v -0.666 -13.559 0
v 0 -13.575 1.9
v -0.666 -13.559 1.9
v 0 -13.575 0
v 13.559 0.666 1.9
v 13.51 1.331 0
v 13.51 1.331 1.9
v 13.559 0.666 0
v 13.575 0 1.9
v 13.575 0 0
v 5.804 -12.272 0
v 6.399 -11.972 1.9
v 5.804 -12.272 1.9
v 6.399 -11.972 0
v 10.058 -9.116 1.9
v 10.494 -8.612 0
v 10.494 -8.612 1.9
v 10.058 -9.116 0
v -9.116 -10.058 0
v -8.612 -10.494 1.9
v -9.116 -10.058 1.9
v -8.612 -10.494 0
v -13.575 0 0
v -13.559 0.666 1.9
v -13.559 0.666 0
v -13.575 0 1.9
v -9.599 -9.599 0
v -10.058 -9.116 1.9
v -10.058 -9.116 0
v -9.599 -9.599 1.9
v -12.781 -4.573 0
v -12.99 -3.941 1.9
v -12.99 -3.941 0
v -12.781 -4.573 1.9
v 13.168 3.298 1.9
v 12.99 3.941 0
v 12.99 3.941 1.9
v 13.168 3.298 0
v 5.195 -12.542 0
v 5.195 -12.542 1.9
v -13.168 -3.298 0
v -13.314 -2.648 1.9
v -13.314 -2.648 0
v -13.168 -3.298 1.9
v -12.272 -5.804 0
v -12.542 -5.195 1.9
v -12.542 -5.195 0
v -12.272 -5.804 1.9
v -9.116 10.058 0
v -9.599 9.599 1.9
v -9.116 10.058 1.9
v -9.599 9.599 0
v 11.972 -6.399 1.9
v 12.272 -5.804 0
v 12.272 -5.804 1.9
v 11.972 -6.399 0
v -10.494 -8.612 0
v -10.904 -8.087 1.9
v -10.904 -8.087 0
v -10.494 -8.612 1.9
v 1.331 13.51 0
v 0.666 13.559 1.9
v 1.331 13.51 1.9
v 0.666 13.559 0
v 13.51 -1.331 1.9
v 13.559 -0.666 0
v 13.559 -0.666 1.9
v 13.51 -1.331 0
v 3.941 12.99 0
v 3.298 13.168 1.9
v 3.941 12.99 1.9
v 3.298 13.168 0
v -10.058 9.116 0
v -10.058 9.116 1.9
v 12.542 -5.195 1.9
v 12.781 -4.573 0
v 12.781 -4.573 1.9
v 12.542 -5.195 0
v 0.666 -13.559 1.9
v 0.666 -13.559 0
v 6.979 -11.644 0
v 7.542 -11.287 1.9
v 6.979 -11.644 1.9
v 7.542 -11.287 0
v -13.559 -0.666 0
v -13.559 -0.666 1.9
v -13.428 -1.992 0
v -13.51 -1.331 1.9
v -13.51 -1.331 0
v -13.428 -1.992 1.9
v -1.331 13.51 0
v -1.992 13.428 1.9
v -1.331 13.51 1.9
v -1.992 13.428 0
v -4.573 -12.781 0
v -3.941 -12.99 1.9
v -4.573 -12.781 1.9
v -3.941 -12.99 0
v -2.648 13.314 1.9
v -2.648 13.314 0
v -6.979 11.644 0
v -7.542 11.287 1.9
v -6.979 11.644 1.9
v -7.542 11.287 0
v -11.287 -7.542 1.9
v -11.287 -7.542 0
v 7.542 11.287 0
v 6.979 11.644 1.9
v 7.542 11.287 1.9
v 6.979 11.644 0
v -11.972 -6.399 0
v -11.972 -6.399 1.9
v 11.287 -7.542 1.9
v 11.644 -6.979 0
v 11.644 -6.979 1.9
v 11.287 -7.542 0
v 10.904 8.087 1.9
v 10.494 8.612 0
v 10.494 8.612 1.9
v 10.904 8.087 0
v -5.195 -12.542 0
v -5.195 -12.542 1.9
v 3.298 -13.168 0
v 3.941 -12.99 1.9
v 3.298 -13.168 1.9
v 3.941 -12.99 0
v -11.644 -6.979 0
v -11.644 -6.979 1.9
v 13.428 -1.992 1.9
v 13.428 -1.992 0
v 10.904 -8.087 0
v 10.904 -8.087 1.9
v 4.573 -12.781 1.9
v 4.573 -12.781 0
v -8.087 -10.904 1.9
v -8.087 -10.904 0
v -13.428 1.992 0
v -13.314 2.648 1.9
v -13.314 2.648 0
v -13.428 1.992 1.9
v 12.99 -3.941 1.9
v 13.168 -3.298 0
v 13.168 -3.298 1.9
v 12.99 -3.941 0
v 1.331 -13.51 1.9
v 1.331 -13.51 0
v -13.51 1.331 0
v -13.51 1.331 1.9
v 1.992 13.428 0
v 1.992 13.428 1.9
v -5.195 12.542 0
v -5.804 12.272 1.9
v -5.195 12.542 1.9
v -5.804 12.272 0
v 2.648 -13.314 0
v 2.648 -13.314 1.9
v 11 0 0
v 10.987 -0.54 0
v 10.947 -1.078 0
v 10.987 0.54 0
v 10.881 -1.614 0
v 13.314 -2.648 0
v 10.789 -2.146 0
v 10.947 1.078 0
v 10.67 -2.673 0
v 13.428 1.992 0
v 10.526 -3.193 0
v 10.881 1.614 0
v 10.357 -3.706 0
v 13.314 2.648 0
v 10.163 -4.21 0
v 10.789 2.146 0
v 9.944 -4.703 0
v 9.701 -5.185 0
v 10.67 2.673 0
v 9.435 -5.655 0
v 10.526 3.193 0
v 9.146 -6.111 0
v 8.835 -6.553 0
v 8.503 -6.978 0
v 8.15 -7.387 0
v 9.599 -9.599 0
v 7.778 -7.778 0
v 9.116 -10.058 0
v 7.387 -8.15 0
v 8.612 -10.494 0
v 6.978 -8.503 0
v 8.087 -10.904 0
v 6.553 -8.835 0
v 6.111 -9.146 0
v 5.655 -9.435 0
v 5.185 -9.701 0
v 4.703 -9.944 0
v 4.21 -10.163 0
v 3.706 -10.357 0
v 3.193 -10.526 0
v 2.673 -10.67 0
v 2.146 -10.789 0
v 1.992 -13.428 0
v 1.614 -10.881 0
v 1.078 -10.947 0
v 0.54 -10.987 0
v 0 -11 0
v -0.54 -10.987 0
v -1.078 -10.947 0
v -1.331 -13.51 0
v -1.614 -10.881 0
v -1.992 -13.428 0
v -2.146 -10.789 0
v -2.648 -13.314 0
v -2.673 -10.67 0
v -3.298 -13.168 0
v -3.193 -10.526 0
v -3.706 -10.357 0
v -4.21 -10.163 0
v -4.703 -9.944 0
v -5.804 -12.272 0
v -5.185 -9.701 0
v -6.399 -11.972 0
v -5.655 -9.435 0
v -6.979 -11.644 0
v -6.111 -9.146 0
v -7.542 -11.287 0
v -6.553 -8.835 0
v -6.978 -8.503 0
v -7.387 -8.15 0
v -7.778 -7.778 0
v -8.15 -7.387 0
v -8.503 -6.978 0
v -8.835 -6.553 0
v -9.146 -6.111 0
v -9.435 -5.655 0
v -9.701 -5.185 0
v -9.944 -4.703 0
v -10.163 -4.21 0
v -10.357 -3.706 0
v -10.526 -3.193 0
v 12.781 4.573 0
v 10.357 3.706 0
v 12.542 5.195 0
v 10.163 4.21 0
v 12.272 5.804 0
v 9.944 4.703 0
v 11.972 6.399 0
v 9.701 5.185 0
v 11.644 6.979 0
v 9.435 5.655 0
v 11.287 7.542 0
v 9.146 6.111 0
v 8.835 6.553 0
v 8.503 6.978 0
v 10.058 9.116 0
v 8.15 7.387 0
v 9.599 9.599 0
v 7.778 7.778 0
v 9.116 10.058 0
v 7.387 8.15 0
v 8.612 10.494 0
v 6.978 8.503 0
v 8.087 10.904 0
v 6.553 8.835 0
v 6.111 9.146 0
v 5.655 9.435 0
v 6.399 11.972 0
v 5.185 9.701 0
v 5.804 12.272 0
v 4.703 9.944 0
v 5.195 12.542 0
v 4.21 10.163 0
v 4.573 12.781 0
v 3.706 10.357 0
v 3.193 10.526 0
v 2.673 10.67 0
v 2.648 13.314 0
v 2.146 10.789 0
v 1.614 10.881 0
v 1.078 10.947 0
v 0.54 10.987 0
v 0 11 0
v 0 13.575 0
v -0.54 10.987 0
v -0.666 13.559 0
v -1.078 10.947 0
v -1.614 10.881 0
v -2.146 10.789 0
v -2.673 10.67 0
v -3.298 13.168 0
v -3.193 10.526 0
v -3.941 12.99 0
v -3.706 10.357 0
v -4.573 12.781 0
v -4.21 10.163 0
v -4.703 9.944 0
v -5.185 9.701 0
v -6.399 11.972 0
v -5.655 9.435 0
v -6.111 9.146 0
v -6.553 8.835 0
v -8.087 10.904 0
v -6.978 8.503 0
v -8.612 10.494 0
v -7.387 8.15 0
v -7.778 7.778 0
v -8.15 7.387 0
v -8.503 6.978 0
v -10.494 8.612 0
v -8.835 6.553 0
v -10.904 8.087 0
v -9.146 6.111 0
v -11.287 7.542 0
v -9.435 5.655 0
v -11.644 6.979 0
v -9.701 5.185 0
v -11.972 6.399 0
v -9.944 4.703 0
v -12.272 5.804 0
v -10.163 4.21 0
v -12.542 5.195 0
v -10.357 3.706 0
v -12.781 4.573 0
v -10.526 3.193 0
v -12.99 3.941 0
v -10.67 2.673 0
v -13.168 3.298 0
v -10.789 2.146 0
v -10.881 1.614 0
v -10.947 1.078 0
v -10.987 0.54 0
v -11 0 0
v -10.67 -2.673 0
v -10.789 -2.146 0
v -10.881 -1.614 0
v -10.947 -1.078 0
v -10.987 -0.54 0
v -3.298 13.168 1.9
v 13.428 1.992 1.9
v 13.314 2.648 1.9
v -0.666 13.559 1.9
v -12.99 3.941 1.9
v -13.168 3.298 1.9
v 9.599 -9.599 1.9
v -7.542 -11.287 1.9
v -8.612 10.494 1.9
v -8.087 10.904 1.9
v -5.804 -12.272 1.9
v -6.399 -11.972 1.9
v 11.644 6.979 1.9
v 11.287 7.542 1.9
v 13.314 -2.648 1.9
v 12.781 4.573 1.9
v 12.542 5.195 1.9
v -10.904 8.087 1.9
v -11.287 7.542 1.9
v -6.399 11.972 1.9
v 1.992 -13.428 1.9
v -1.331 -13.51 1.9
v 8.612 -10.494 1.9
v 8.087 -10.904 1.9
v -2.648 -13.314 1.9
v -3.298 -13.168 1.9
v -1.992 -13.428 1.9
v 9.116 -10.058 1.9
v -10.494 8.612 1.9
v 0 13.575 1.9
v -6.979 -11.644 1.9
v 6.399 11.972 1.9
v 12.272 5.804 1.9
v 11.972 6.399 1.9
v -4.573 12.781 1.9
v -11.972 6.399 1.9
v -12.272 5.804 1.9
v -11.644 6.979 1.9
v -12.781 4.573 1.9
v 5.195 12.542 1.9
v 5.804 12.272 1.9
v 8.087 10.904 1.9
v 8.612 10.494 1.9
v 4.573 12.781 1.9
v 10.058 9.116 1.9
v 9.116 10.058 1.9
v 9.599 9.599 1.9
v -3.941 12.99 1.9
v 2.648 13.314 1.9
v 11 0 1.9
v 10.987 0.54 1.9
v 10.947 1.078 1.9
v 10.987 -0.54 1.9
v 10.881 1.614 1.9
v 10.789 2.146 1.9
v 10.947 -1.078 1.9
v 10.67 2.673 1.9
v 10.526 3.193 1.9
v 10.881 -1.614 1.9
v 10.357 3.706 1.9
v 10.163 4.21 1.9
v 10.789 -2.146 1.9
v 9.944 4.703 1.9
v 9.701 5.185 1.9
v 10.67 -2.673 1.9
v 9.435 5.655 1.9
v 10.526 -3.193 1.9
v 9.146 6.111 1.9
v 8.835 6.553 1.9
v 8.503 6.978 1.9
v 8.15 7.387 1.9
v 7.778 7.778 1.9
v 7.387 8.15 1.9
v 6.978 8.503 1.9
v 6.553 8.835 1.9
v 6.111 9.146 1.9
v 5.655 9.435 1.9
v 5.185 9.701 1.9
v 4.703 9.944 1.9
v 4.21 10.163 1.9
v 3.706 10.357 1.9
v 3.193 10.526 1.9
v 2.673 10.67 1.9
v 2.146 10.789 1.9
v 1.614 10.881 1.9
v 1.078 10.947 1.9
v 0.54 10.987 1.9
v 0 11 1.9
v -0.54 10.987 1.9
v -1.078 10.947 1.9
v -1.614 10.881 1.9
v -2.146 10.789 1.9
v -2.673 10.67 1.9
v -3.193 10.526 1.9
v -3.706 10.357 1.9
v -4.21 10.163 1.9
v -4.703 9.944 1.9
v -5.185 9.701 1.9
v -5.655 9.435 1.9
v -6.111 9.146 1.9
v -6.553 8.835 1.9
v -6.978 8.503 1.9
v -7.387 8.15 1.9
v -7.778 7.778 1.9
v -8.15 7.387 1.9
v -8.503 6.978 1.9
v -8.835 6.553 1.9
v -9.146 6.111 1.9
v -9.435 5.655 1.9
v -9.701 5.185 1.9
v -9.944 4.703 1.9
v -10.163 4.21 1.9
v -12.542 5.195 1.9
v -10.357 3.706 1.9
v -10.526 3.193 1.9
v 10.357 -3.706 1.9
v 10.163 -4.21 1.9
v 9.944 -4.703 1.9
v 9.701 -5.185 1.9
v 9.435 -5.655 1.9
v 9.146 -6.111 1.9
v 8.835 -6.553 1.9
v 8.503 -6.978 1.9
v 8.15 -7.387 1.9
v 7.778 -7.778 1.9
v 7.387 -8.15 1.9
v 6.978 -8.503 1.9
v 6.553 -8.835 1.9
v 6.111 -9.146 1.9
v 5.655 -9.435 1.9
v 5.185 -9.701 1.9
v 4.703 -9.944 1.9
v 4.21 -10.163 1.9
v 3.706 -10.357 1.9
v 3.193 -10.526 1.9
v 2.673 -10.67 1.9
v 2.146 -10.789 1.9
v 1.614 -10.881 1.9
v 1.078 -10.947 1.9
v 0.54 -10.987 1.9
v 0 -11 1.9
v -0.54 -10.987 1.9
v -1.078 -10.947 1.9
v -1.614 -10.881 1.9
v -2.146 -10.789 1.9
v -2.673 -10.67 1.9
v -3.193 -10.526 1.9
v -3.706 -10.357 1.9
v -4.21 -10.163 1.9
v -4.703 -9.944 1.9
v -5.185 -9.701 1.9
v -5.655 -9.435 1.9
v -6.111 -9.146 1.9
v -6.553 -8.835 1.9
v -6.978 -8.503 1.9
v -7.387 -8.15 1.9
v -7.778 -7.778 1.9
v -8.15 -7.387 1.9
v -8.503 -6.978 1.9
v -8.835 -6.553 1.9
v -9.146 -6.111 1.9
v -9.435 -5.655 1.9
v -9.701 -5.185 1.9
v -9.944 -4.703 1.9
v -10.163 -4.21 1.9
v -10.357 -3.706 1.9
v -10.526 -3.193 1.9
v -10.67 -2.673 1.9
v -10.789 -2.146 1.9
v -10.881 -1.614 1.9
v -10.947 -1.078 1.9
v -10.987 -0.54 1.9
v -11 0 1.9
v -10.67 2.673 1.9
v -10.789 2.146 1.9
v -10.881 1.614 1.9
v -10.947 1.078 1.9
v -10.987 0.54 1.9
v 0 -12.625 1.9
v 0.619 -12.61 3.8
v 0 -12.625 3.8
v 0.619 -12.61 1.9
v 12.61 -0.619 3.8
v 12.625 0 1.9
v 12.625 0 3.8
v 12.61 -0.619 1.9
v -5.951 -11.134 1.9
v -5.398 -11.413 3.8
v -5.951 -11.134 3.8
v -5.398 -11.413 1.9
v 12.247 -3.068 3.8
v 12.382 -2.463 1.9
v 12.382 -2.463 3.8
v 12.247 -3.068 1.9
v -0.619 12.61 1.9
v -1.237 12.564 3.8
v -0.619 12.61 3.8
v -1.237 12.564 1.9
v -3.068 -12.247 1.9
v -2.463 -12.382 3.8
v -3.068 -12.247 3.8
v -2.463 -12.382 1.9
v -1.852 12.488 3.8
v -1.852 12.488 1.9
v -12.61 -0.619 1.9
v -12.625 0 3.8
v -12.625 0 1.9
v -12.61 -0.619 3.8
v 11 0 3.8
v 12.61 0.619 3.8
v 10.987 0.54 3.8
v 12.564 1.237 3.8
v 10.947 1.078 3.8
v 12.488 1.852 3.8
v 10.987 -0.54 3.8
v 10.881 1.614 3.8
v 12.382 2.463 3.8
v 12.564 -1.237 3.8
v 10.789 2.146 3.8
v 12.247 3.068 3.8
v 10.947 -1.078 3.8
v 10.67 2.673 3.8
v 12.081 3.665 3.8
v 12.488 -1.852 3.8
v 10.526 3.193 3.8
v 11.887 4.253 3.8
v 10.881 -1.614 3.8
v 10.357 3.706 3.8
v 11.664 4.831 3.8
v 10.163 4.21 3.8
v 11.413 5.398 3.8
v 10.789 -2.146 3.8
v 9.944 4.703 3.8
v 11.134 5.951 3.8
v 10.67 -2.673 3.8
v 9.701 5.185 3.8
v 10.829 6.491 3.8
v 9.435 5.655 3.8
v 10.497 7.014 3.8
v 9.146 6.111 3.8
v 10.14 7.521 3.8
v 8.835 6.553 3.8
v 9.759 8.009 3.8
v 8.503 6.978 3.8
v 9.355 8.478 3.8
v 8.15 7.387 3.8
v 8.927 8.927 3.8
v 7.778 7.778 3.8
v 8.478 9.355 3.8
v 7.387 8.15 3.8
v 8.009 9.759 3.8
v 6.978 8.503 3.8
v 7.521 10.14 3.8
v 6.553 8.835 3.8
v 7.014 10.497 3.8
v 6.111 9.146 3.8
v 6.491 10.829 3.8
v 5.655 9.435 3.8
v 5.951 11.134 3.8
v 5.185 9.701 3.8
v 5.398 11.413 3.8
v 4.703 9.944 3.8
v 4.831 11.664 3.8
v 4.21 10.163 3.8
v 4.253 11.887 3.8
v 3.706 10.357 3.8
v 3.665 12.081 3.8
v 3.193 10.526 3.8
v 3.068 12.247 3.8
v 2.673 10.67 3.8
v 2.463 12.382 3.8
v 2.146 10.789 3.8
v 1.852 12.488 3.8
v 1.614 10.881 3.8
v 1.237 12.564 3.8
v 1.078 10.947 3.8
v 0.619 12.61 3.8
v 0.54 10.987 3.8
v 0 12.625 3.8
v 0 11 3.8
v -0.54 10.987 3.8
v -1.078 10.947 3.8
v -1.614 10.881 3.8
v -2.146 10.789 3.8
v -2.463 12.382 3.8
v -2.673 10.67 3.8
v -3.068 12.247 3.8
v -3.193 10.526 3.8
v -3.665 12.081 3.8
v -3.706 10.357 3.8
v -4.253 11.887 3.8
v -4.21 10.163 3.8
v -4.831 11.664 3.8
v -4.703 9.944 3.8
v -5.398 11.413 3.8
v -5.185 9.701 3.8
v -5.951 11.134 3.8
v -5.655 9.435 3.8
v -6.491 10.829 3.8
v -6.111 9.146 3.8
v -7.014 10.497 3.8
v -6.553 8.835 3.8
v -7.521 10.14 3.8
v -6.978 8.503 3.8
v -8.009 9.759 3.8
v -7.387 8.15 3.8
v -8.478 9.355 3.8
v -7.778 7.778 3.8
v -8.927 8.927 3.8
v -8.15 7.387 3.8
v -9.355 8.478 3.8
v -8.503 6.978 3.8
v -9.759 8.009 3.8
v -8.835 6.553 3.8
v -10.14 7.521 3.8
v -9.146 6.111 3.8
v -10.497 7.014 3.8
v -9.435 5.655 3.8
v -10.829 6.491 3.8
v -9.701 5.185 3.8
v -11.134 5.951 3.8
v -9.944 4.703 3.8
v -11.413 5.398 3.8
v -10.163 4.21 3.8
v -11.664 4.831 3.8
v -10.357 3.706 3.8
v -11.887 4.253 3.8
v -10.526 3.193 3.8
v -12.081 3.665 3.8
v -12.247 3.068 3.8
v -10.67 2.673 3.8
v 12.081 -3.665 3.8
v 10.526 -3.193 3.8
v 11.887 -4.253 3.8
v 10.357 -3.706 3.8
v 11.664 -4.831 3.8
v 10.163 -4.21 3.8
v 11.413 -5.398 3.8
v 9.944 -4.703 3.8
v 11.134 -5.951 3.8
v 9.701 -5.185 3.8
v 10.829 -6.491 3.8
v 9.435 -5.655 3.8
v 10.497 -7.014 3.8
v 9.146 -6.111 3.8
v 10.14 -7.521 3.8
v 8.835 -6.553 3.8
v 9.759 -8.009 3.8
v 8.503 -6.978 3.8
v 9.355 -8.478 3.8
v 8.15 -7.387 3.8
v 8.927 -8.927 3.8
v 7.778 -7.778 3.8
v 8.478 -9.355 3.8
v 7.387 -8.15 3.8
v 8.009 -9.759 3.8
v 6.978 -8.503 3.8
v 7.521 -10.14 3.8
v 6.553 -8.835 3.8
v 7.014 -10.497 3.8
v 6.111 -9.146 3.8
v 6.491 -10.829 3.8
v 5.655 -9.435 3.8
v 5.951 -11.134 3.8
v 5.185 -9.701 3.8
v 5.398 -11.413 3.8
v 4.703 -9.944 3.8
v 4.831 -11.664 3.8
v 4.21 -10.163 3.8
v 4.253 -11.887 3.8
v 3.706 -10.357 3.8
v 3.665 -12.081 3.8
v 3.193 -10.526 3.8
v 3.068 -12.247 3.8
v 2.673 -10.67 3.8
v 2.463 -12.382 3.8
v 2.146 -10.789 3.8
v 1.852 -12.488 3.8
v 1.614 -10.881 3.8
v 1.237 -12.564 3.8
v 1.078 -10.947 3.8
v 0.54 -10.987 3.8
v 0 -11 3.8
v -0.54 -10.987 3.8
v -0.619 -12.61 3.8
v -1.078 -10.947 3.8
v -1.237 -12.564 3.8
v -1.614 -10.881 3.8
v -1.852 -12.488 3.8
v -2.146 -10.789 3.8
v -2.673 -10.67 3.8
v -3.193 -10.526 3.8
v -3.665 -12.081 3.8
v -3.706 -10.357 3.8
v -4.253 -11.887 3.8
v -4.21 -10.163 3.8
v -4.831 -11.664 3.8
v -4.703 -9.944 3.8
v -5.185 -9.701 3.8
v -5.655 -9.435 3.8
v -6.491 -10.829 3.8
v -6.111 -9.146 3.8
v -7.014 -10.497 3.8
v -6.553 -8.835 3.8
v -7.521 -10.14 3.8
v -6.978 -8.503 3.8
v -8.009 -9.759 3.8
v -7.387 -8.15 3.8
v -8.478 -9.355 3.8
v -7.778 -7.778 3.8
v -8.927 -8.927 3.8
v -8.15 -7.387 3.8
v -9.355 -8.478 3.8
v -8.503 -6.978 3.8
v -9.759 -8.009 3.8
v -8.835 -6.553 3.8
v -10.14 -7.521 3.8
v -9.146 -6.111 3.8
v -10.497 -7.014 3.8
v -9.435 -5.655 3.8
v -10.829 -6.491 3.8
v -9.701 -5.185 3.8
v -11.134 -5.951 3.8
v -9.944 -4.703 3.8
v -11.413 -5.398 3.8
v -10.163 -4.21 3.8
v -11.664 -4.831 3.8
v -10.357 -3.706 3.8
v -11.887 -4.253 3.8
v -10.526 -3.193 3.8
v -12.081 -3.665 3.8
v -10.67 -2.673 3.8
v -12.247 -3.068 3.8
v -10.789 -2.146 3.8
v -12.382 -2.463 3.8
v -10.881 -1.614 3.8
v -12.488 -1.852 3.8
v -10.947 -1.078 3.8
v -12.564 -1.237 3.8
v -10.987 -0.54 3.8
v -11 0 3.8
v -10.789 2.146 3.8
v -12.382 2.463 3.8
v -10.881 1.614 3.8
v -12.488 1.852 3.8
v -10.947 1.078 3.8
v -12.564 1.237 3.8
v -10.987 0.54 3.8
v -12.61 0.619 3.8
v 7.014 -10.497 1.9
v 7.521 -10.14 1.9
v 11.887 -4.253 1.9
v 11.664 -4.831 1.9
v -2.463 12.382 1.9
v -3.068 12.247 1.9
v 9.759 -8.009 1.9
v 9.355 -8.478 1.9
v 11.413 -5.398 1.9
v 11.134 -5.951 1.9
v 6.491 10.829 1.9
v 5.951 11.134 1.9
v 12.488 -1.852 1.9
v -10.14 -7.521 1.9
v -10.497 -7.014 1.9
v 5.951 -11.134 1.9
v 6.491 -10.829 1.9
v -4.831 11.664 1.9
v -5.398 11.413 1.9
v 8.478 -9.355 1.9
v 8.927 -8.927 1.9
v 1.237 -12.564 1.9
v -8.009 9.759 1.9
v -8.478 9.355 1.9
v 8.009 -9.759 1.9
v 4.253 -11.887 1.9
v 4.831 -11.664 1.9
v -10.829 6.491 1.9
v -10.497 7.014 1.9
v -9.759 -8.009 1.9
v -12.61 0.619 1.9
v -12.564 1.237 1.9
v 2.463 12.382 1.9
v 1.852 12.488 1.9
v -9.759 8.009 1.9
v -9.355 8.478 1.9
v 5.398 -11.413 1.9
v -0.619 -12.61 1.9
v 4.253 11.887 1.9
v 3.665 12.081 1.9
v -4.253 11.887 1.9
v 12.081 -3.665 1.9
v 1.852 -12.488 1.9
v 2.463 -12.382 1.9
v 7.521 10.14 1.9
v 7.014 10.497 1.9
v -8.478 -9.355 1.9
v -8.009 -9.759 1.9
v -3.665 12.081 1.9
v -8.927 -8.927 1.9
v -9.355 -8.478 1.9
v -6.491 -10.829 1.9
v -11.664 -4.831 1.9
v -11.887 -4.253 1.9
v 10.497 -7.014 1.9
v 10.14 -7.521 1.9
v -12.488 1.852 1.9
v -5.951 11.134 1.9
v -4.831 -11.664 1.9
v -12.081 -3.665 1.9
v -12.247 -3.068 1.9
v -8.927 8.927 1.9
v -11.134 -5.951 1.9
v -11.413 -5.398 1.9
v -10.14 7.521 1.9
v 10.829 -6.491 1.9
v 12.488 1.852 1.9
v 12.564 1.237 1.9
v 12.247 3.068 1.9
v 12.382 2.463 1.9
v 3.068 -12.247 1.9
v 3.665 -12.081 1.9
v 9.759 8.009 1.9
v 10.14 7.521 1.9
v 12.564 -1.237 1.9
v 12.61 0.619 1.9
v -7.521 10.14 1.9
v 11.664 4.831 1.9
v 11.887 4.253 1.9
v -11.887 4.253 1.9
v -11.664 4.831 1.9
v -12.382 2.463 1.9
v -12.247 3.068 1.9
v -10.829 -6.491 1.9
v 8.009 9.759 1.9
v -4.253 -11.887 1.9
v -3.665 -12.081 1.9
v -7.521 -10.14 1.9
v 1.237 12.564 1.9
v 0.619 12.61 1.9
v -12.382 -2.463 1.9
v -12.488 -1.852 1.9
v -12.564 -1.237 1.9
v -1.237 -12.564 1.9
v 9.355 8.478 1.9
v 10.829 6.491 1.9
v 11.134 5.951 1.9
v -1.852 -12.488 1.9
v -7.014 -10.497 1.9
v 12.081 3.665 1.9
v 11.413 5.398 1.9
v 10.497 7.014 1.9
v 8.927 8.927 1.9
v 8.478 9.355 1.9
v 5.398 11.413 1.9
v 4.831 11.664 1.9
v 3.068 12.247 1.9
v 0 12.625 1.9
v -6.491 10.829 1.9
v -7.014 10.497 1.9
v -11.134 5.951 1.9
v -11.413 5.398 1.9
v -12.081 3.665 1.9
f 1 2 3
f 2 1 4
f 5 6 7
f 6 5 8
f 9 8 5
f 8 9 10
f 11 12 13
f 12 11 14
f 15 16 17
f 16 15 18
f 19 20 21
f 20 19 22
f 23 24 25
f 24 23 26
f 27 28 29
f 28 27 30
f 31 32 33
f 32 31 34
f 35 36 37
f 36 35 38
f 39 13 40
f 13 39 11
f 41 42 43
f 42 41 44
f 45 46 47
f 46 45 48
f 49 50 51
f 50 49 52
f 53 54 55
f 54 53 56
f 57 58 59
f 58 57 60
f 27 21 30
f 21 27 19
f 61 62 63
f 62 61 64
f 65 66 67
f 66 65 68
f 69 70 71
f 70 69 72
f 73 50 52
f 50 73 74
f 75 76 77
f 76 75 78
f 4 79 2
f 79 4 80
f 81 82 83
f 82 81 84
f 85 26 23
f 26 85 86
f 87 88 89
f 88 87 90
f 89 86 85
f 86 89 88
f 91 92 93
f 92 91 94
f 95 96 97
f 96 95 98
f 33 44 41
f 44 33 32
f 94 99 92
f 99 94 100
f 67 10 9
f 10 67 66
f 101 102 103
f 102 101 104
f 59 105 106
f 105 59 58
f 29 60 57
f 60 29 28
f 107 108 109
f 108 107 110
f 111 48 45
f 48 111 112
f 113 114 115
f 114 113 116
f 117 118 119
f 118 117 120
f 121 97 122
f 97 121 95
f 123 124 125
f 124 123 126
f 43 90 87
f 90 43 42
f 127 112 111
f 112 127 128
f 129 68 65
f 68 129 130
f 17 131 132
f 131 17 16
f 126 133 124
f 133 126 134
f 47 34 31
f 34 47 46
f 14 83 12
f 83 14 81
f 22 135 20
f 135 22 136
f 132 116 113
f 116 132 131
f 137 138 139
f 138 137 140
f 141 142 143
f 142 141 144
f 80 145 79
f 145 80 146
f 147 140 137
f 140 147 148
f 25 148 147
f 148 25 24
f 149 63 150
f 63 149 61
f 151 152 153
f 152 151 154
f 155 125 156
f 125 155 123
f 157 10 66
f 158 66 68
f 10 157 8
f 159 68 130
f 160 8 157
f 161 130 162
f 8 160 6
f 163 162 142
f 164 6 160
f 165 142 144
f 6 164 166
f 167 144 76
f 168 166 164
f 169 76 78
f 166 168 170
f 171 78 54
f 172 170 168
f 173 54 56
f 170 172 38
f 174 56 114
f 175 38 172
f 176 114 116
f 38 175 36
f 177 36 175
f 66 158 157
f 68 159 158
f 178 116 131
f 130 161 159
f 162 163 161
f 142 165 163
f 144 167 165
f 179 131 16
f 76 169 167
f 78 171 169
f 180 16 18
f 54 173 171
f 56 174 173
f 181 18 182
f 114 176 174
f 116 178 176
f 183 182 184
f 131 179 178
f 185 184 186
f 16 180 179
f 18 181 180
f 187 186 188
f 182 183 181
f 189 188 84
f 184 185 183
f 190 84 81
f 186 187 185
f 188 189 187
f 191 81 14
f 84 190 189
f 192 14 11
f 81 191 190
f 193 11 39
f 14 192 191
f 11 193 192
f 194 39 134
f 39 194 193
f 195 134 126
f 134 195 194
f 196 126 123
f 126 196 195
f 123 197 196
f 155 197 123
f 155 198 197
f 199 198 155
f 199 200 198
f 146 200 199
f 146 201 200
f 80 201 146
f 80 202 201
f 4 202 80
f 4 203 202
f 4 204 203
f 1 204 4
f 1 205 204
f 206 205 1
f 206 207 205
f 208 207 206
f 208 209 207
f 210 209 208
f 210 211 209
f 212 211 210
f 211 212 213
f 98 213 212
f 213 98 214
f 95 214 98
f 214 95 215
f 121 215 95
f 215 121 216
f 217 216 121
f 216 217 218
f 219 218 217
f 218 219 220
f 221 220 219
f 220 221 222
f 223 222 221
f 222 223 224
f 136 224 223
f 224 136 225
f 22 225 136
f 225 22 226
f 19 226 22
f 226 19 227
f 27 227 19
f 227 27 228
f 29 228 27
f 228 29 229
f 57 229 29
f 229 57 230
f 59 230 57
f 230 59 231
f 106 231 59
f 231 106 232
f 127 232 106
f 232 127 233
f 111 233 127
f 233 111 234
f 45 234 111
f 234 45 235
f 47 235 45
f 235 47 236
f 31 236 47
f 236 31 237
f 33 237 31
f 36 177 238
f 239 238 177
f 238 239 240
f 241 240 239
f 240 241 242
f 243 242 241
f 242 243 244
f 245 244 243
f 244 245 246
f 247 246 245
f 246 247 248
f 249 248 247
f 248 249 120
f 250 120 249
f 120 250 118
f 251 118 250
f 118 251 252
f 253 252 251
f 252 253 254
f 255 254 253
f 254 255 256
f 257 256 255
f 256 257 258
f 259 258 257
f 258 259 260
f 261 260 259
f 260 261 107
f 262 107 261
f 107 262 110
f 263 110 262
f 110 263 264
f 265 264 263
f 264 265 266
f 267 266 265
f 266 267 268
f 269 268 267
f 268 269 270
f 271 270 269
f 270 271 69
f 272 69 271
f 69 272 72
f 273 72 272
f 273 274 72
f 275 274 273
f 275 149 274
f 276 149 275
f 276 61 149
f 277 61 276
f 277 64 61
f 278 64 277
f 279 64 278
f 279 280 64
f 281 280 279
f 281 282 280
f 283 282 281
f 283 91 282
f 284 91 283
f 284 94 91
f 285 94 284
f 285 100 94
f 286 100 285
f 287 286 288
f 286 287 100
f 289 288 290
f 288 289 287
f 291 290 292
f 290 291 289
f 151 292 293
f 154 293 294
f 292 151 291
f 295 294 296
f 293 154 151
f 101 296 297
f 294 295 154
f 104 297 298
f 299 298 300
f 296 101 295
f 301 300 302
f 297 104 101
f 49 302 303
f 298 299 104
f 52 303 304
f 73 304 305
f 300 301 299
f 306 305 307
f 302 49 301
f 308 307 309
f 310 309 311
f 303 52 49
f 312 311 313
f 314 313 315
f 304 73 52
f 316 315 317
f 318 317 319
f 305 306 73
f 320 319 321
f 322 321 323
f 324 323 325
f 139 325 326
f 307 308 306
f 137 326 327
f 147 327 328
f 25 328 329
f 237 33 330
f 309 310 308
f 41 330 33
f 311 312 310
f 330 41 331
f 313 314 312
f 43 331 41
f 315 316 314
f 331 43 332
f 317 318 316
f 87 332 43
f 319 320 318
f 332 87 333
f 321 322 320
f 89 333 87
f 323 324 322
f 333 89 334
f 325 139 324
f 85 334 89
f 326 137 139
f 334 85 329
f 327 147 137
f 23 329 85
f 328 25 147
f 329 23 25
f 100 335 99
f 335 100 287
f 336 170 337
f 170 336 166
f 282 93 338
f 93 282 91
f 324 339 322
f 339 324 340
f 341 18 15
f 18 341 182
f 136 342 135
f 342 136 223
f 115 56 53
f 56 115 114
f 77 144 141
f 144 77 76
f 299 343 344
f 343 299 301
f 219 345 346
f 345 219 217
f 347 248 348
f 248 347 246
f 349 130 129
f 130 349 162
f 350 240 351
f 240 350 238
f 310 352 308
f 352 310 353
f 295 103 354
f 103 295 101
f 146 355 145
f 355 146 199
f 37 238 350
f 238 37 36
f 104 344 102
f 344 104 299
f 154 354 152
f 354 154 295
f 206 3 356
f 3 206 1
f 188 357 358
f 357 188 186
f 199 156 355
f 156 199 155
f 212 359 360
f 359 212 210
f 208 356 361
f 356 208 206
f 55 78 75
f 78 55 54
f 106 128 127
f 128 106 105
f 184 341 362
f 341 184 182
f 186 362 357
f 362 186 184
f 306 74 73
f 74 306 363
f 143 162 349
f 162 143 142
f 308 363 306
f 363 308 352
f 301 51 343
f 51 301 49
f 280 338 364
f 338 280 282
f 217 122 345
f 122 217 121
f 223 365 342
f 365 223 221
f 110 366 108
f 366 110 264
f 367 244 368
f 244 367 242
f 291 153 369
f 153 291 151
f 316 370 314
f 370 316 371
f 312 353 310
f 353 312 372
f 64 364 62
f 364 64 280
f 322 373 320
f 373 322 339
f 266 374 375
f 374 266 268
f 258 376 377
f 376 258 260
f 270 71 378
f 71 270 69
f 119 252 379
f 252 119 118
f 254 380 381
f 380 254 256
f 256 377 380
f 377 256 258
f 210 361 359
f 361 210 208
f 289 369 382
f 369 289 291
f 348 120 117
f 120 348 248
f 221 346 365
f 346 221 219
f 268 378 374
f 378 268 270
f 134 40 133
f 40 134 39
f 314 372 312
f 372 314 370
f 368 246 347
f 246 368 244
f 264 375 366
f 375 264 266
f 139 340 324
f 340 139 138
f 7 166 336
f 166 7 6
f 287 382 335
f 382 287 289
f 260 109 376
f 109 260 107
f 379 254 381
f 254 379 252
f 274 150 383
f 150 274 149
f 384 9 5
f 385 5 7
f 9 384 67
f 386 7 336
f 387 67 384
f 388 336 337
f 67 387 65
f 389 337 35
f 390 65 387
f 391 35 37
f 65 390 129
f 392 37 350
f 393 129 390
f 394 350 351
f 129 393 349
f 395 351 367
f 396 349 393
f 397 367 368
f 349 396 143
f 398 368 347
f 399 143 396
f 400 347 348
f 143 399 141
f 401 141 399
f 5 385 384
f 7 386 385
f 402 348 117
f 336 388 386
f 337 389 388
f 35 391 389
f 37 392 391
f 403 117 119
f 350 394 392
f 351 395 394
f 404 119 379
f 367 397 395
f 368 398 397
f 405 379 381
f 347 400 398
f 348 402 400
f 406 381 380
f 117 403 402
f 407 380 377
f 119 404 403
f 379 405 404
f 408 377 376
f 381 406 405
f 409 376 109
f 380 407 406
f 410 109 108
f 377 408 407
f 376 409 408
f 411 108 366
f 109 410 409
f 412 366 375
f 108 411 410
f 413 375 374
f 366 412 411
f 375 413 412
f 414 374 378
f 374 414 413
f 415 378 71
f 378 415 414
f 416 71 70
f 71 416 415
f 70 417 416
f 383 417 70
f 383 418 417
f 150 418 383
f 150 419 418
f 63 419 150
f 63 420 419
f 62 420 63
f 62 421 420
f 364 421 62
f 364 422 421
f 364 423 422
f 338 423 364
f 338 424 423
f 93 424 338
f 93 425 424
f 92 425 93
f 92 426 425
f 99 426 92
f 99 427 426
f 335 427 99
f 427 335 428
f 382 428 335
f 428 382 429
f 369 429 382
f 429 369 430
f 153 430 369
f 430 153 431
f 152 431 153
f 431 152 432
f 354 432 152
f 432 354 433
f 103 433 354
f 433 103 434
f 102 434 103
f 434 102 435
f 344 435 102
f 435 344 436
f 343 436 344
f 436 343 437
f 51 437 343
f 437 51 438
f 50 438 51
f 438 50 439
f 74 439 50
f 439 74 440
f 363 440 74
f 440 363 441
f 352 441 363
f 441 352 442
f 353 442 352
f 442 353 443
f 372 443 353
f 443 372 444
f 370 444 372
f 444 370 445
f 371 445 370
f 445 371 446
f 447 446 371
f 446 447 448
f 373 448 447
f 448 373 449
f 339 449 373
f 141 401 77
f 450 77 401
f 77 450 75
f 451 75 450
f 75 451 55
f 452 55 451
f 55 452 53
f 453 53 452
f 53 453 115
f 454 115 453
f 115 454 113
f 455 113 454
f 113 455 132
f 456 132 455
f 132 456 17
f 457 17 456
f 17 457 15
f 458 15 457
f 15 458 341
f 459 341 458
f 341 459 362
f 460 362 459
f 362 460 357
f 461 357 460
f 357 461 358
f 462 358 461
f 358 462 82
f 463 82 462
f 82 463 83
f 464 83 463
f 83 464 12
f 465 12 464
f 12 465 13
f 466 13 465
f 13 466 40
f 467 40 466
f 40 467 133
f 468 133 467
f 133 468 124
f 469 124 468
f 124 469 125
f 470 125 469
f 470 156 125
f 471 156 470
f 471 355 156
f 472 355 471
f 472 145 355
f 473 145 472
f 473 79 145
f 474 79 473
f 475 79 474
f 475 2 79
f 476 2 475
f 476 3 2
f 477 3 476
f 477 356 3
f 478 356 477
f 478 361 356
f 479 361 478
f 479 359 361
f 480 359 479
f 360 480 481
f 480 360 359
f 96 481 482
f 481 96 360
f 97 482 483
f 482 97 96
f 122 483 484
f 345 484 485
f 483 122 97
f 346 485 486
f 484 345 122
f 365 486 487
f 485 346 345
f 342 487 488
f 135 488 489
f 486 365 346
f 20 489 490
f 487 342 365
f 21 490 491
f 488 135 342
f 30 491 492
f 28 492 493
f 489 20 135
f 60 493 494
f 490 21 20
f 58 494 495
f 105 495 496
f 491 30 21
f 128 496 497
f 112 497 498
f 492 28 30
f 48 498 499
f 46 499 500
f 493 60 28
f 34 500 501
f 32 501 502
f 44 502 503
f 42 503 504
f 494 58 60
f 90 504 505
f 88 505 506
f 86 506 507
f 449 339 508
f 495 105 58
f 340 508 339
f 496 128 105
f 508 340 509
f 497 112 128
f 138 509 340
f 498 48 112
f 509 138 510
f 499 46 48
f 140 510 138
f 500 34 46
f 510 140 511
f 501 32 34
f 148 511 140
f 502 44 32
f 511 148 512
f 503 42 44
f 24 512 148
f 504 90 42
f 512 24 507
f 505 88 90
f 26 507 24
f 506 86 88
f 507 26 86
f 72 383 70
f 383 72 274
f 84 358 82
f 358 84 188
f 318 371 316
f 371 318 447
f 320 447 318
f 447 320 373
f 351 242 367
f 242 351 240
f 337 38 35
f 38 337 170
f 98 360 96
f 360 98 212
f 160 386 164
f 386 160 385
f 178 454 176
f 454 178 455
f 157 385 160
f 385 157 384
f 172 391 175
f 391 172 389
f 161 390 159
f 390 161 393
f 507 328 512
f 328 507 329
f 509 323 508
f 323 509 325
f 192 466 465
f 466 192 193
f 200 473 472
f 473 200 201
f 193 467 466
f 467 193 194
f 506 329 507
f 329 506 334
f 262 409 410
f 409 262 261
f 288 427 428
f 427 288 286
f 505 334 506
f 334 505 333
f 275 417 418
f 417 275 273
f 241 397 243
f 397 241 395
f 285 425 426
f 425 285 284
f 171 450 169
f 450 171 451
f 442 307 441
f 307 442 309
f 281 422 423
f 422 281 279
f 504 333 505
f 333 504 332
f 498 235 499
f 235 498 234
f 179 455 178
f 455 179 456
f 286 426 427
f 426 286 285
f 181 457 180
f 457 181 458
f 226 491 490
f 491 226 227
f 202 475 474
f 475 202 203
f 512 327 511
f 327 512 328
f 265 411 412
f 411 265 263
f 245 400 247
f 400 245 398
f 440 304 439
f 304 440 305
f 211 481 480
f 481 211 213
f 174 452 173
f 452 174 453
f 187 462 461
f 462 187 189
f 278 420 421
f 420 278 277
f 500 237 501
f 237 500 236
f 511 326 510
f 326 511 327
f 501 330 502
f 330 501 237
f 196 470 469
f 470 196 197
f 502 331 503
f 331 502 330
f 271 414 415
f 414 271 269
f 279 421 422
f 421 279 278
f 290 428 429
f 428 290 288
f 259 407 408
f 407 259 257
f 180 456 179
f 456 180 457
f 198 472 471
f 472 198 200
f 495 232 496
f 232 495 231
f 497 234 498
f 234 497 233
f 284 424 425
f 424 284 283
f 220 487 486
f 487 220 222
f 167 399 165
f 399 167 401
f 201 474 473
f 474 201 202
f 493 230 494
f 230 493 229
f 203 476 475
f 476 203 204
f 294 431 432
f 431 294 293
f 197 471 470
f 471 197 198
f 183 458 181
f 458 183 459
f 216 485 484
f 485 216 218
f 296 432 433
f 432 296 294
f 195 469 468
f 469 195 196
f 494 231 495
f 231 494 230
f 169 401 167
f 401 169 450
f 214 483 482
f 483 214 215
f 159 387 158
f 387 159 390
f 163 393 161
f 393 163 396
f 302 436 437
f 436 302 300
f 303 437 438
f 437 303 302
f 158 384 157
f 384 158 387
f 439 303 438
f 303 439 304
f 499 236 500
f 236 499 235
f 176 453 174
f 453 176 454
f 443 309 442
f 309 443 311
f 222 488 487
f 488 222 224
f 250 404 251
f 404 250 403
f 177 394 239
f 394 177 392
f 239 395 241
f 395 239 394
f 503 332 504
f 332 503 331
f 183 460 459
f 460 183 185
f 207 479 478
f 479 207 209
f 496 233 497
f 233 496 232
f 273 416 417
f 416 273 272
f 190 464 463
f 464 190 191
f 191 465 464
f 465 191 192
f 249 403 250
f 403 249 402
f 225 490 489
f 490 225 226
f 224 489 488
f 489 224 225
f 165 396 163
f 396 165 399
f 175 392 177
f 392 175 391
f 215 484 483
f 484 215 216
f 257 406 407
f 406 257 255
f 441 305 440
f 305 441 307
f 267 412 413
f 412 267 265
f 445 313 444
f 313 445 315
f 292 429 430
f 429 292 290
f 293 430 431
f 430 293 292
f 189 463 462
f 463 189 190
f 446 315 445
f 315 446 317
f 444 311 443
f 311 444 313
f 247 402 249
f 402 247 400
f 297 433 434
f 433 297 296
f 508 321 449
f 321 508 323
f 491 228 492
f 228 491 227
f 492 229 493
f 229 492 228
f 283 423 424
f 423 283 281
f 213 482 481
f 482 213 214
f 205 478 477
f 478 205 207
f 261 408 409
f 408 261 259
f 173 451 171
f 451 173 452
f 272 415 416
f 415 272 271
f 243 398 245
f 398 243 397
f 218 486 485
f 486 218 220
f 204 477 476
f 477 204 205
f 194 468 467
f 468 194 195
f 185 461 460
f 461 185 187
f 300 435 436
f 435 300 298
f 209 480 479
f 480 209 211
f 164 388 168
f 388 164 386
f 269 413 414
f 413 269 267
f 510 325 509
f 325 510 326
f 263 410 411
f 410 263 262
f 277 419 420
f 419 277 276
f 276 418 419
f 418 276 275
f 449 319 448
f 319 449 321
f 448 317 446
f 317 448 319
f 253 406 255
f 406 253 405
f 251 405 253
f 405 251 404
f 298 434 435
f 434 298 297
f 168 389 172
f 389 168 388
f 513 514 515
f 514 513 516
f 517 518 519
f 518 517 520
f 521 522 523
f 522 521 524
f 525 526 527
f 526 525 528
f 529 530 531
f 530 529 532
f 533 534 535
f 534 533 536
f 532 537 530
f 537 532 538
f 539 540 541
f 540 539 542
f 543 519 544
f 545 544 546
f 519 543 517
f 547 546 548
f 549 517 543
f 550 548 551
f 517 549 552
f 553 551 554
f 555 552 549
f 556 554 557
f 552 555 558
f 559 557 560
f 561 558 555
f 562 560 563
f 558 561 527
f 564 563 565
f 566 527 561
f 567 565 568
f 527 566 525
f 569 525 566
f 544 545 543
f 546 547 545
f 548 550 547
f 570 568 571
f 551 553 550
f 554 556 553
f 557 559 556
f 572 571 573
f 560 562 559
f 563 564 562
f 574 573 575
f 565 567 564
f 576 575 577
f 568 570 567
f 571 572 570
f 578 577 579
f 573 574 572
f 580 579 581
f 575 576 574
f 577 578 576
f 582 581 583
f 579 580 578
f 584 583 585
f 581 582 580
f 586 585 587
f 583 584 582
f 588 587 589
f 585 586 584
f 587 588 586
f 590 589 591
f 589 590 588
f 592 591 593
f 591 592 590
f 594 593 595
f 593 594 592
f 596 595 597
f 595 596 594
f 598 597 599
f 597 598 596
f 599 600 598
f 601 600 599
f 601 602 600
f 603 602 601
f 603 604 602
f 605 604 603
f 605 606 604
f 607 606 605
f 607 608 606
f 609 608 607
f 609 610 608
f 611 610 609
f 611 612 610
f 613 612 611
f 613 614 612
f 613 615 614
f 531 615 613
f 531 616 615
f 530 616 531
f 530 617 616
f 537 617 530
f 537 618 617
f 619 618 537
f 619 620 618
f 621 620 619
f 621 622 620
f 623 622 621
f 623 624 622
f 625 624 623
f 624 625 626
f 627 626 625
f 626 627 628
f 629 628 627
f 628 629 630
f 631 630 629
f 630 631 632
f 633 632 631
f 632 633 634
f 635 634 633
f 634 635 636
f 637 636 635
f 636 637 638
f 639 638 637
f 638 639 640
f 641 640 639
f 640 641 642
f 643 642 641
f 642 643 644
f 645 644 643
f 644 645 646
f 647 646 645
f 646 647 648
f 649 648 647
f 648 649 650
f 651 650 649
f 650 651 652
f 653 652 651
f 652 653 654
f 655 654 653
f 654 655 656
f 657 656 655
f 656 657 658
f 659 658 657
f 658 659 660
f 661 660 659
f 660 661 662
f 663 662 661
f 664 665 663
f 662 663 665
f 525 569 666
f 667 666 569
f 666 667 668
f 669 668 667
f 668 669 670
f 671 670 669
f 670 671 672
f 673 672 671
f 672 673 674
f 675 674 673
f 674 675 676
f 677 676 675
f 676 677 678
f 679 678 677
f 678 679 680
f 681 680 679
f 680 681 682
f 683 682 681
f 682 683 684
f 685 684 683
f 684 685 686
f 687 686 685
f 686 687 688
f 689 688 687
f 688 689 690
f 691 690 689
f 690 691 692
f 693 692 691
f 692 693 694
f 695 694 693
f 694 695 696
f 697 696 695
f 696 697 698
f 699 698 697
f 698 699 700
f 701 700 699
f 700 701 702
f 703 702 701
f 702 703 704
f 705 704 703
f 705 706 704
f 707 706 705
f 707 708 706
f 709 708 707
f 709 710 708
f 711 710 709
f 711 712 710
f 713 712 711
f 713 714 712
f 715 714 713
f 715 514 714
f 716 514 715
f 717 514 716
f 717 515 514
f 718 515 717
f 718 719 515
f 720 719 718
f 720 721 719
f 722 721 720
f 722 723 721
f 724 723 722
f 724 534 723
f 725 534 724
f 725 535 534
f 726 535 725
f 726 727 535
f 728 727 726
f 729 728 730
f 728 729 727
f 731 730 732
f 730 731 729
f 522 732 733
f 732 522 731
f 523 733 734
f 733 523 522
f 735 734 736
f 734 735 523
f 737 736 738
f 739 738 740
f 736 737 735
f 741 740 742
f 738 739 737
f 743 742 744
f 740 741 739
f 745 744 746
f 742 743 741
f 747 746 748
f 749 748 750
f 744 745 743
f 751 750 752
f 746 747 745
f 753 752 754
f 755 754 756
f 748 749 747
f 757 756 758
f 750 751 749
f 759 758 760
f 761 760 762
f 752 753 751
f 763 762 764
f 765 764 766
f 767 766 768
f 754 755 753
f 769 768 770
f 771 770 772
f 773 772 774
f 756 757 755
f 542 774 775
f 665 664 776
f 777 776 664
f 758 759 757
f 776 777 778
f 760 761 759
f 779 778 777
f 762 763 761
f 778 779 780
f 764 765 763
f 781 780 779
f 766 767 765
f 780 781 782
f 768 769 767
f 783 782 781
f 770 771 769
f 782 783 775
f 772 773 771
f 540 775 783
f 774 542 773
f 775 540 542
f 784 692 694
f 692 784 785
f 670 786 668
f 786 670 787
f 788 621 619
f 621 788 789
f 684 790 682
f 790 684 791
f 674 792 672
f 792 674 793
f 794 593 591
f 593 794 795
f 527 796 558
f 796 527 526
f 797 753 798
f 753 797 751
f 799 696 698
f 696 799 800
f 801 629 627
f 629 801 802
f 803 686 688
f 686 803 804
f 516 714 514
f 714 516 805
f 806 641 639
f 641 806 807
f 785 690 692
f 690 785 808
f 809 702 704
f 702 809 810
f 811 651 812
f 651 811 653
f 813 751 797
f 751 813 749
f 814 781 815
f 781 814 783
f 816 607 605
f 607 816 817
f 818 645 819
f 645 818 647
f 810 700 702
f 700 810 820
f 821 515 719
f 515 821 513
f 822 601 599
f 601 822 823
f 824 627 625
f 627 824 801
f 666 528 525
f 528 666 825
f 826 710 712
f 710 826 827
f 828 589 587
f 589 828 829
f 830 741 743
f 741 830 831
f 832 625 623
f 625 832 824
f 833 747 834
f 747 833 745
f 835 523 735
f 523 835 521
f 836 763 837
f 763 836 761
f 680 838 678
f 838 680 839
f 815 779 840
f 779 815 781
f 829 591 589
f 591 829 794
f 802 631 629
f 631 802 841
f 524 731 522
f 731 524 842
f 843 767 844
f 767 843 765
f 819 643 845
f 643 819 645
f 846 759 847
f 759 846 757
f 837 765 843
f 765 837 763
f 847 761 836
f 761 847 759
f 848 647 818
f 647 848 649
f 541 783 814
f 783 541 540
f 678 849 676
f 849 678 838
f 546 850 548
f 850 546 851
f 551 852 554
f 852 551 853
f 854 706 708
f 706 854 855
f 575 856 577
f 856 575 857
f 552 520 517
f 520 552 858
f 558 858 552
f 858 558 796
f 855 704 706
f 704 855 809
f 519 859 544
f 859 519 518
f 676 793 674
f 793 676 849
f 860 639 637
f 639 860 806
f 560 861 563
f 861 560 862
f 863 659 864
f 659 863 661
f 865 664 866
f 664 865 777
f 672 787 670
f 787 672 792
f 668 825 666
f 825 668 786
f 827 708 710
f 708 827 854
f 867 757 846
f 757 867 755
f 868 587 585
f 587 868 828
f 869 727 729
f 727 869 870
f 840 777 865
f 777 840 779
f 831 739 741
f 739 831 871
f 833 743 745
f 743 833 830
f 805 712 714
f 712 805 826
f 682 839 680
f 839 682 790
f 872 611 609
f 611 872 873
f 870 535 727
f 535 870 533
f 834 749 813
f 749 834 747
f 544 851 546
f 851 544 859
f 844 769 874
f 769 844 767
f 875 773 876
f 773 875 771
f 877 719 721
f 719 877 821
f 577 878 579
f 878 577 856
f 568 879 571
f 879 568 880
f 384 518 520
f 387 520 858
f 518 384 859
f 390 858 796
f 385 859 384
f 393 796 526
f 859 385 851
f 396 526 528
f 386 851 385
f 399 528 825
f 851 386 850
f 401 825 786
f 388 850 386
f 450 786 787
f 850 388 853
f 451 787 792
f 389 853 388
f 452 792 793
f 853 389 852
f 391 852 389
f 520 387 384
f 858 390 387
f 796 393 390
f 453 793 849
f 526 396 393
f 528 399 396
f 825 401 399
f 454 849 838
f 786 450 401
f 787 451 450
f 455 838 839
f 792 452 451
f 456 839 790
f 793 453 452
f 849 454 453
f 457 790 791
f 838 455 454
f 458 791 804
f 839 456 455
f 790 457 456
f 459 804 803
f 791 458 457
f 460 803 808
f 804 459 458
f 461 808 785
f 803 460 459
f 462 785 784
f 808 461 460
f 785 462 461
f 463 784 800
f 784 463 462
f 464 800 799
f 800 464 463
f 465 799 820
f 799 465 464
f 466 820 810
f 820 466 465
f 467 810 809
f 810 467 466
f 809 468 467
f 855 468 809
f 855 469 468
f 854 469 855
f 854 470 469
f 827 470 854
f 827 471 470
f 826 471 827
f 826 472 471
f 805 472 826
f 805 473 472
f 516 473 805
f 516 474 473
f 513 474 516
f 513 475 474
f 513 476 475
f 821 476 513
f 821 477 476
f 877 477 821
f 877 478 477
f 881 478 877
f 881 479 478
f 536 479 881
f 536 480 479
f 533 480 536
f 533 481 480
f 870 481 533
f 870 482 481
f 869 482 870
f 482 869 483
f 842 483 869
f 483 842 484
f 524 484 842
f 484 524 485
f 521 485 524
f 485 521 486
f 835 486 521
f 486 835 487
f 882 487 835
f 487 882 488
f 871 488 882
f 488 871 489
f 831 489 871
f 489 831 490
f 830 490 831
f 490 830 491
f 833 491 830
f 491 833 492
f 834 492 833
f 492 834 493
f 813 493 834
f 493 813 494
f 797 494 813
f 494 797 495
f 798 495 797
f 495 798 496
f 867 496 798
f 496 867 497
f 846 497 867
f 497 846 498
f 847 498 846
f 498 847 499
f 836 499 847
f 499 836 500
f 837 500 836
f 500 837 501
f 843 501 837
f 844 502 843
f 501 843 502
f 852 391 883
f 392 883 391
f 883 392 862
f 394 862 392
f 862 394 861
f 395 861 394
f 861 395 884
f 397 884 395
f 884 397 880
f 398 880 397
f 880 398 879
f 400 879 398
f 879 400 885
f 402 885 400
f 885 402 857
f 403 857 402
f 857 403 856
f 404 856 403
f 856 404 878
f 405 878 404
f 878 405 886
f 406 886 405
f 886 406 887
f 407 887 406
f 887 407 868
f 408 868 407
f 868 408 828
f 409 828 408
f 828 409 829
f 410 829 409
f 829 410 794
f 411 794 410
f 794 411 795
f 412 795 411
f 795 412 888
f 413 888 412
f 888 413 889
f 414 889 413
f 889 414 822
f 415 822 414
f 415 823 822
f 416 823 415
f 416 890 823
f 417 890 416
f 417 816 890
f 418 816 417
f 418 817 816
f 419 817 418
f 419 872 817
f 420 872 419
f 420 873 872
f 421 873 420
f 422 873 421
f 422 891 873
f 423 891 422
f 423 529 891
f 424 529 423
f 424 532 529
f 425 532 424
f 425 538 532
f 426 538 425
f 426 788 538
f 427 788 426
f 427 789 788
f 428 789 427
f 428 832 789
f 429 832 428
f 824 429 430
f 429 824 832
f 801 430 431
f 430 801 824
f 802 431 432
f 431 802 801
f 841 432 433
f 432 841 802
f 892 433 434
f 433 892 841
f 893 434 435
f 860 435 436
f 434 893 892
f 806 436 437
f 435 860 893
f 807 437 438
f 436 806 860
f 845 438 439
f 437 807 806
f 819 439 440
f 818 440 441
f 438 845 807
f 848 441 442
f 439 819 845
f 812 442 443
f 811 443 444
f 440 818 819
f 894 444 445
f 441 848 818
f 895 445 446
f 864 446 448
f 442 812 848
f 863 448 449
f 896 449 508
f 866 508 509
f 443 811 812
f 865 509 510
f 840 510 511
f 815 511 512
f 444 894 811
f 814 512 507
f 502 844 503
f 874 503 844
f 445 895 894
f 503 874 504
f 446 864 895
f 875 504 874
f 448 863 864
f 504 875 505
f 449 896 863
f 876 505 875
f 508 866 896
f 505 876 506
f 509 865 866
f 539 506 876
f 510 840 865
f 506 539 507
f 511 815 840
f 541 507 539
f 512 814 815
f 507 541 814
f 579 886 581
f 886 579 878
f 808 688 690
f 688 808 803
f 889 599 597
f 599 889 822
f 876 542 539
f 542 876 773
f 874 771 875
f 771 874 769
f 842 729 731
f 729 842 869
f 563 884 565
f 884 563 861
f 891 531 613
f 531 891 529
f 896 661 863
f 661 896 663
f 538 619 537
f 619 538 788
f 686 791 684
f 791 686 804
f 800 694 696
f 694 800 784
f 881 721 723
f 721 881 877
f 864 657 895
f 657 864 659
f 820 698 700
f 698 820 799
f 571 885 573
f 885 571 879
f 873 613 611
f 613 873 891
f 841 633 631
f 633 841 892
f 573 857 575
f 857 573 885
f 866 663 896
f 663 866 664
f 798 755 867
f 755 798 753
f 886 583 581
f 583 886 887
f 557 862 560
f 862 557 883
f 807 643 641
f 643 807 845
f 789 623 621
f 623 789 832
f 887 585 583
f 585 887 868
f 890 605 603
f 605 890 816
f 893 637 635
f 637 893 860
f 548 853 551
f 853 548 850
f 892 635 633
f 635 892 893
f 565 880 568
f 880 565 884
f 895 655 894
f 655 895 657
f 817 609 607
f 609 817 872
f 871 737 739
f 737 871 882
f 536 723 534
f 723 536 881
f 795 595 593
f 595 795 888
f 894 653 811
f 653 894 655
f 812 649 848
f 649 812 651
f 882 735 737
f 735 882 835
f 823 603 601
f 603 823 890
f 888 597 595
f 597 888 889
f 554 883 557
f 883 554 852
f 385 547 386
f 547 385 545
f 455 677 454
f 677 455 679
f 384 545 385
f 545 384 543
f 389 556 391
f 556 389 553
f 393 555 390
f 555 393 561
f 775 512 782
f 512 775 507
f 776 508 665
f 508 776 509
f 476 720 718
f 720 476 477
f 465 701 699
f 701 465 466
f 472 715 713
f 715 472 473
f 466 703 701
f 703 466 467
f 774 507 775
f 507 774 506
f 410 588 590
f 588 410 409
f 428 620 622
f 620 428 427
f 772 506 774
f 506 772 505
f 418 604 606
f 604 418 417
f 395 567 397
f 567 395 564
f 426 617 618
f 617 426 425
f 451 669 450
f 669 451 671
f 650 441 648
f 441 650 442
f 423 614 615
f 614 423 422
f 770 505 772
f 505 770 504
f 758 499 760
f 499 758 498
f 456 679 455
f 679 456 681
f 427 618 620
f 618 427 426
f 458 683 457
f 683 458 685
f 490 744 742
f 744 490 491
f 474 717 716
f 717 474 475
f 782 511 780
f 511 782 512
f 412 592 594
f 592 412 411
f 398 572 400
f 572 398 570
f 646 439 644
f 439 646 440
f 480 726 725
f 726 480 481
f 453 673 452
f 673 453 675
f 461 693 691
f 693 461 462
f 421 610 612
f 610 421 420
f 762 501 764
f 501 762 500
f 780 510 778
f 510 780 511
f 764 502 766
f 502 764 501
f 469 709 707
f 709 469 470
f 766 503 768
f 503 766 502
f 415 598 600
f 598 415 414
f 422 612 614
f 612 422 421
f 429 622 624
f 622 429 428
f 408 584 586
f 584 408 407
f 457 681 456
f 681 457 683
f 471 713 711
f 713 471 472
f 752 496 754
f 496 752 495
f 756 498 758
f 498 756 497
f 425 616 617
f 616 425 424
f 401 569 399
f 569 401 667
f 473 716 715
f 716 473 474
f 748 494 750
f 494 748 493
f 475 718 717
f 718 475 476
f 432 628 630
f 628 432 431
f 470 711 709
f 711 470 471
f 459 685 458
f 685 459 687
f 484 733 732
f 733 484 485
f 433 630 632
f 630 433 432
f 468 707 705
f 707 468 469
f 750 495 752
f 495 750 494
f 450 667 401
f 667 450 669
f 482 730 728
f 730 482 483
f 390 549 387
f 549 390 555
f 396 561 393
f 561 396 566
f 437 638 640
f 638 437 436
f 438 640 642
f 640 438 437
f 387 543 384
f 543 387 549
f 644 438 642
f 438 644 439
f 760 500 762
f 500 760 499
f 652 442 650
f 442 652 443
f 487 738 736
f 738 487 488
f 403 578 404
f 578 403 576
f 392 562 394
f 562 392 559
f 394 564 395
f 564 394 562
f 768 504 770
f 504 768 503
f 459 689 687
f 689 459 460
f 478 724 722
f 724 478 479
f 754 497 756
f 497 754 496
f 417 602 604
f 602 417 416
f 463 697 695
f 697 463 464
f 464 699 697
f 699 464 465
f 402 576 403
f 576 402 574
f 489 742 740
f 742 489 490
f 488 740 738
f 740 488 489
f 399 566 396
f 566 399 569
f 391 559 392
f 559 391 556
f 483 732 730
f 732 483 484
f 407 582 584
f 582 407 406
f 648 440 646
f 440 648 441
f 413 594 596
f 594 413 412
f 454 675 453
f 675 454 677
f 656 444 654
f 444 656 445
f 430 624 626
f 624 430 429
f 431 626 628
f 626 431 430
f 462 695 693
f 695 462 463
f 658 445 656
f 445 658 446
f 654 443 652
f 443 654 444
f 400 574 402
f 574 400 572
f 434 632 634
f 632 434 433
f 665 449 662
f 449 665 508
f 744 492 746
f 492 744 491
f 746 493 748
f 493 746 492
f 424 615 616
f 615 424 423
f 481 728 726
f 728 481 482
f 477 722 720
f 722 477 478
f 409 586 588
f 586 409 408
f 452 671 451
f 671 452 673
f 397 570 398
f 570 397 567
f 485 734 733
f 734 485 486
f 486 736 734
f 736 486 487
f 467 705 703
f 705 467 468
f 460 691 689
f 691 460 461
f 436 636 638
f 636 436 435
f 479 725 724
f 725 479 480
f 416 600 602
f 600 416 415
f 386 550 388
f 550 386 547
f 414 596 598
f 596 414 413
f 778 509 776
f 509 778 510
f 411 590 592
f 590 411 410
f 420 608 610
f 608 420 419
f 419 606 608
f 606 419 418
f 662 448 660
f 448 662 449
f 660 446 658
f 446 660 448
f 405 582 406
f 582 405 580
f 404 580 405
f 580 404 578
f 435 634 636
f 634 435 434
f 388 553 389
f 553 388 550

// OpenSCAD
// file: measurements.scad
thickness = 1.9;
finger_d = 22;

module holder(h) {
    // Child 0 is the outer shape
    // Child 1 is the inner shape
    // Child 2 is the end-cap hole shape
    // Bottom end
    difference() {
        linear_extrude(thickness) { children(0); }
        translate([0, 0, -1])
            linear_extrude(thickness+2) { children(2); }
    }
    // Main chamber: h + thickness to leave room for the lid.
    translate([0, 0, thickness])
        difference() {
            linear_extrude(h + thickness) { children(0); }
            translate([0, 0, -1])
                linear_extrude(h + thickness + 2) { children(1); }
        }
}

module lid() {
    // Child 0 is the outer shape
    // Child 1 is the inner shape
    // Child 2 is the end-cap hole shape
    // Bottom end
    difference() {
        linear_extrude(thickness) { children(0); }
        translate([0, 0, -1])
            linear_extrude(thickness+2) { children(2); }
    }
    // Cap plug
    translate([0, 0, thickness])
        difference() {
            linear_extrude(thickness) { children(1); }
            translate([0, 0, -1])
                linear_extrude(thickness+2) { children(2); }
        }
}

//
// Discovery Tiles
//

discovery_w = 24;
discovery_count = 21;

function discovery_corner_r(w) = w * 7 / 24;

module discovery_tile_shape(w) {
    r = discovery_corner_r(w);
    translate([-w/2, -w/2]) {
        translate([w-r, w-r])
            circle(r=r, $fn=64);
        square([w-r, w]);
        square([w, w-r]);
    }
}

//
// Ancients
//

ancient_r = 19.5;
ancient_count = 22;

//
// Monotliths/Orbitals
//

monolith_orbital_d = 25.25;
monolith_orbital_count = 22;
// main file
include <measurements.scad>

lid() {
    circle(d=monolith_orbital_d+thickness, $fn=128);
    circle(d=monolith_orbital_d, $fn=128);
    circle(d=finger_d, $fn=128);
}
